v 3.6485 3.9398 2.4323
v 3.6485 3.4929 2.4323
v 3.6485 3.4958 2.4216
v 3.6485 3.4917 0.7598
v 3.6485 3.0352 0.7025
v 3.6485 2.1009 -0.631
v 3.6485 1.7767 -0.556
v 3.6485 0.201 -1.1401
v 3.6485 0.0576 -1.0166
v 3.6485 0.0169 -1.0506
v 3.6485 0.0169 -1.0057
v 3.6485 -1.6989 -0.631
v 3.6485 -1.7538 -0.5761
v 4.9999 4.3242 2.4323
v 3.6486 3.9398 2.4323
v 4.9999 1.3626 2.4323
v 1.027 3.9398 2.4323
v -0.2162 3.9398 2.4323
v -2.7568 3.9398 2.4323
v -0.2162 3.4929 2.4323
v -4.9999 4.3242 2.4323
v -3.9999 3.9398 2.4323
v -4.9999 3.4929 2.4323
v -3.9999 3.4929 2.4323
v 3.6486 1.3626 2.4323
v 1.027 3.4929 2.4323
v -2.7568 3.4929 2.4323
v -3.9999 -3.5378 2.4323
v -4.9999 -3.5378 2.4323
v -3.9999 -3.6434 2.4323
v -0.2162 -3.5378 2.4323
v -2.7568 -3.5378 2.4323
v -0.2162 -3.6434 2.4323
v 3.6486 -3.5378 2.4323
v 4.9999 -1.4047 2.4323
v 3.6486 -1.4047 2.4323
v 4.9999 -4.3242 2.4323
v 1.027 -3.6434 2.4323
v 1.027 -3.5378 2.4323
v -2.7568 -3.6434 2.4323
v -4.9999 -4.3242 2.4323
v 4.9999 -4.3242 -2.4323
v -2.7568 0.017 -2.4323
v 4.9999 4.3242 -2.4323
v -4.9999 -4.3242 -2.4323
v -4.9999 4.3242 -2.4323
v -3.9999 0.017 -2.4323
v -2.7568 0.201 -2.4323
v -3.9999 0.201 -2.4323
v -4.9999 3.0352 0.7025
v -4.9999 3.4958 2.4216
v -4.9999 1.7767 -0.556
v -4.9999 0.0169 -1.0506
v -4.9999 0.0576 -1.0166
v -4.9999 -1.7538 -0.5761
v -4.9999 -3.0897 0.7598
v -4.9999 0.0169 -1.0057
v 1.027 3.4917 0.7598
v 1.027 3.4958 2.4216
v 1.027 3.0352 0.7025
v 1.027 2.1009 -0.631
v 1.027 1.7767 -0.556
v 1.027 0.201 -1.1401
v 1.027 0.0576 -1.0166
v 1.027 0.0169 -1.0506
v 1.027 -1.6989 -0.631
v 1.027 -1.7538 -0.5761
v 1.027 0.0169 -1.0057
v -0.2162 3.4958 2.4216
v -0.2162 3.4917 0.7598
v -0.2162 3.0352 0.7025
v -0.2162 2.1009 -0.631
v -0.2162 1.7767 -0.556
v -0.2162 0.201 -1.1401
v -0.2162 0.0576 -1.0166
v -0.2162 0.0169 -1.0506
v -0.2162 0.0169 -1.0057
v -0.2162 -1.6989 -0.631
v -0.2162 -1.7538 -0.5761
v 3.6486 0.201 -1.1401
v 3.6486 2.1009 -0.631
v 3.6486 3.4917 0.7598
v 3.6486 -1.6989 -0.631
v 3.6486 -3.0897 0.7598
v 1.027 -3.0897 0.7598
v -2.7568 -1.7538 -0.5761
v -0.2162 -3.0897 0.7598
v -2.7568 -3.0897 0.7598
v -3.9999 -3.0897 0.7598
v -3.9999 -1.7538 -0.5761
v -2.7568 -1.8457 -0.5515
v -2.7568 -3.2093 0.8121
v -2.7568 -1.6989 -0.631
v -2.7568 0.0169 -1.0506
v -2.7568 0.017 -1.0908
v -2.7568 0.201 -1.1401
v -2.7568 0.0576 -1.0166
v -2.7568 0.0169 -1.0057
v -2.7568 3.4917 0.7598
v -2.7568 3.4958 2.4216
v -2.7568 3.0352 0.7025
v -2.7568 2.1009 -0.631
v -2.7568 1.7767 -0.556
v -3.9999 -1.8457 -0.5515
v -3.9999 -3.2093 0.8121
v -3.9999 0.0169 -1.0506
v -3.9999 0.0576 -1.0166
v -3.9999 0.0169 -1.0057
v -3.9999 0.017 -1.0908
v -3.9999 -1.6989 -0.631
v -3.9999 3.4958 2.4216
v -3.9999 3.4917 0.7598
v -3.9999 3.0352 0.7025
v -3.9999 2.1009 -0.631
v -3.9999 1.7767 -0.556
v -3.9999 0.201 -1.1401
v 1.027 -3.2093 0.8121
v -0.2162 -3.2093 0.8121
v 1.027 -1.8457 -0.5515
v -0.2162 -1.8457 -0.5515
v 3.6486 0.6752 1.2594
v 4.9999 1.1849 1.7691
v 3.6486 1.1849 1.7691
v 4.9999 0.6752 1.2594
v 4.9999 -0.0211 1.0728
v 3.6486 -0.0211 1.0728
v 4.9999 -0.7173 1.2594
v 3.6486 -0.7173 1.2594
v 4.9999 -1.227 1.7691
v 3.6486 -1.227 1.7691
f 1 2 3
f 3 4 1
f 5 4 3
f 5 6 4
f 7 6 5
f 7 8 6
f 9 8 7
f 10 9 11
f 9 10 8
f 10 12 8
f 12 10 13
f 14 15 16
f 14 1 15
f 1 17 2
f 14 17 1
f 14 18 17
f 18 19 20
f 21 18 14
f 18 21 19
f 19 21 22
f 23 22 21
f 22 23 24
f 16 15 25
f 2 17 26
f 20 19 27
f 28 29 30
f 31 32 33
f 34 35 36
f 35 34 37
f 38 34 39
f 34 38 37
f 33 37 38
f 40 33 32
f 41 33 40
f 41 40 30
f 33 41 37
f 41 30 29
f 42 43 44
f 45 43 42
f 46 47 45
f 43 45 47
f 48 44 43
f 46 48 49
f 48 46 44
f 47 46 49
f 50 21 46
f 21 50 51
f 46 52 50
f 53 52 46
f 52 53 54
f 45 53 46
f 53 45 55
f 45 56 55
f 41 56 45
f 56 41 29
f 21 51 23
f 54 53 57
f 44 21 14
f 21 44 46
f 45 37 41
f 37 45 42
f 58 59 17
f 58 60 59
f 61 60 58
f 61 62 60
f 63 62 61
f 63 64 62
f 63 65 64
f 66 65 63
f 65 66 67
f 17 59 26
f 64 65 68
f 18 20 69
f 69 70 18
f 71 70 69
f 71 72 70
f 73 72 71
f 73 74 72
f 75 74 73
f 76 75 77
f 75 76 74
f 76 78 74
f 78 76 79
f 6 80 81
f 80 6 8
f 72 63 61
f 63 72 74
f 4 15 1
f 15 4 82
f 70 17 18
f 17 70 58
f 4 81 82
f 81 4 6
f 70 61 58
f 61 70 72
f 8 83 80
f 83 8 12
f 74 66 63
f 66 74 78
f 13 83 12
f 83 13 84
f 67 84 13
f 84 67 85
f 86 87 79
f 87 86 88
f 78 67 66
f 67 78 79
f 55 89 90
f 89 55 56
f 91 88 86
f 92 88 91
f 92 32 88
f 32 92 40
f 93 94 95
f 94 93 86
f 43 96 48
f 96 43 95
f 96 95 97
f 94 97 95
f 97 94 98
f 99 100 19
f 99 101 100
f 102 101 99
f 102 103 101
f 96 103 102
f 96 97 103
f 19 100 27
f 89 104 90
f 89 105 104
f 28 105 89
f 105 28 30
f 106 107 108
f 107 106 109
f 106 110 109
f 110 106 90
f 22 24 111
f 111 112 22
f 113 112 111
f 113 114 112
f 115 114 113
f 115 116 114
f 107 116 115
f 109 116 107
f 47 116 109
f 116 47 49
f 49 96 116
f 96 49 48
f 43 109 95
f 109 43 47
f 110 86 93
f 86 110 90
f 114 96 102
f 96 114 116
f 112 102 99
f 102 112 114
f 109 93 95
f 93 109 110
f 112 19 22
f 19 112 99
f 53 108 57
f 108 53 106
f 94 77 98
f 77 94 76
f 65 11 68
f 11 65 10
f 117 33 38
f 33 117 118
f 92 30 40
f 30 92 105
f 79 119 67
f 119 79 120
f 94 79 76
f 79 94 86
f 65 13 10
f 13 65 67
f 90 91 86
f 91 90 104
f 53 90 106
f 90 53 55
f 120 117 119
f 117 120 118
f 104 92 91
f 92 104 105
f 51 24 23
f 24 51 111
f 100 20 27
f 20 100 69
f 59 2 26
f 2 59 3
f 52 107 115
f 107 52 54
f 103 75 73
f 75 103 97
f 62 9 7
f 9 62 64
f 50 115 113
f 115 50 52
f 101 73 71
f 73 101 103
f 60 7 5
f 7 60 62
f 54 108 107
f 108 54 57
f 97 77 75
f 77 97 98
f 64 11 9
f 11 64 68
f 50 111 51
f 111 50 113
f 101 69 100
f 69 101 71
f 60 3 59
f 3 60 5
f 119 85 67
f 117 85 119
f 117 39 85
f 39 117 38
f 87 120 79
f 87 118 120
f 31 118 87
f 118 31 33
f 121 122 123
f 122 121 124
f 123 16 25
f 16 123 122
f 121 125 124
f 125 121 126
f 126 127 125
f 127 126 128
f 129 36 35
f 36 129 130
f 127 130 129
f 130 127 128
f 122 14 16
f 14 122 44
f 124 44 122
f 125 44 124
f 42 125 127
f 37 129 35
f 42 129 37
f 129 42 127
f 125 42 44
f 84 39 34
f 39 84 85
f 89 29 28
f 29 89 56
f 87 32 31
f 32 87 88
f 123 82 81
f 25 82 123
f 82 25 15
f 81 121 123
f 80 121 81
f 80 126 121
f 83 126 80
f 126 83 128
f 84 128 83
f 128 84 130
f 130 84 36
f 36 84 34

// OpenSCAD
intersection() {
  cube(size = [11.9998, 10.3782, 5.83763], center = true);

  union() {
    union() {
      difference() {
        difference() {
          difference() {
            difference() {
              translate([-0.675675, 0, 0])
              cube(size = [8.64845, 8.64844, 4.86466], center = true);
            
              translate([0.405405, 0.20101, 2.65962])
              rotate([0, 90, 0])
              cylinder(h = 1.24315, r1 = 3.79973, r2 = 3.79973, center = true, $fn = 12);
            }
          
            union() {
              translate([-3.37838, 0.108975, 0])
              cube(size = [1.24314, 0.18397, 4.86476], center = true);
            
              translate([-3.37838, 0.20101, 2.65962])
              rotate([0, 90, 0])
              cylinder(h = 1.24314, r1 = 3.79973, r2 = 3.79973, center = true, $fn = 12);
            }
          }
        
          intersection() {
            translate([-0.675675, -2.15369, 7.88379])
            cube(size = [8.64855, 4.34116, 20.6323], center = true);
          
            translate([-7.27568, 0.01694, 2.67473])
            rotate([0, 90, 0])
            cylinder(h = 21.8485, r1 = 3.72531, r2 = 3.72531, center = true, $fn = 12);
          }
        }
      
        translate([-7.27568, 0.05763, 2.42156])
        rotate([0, 90, 0])
        cylinder(h = 21.8485, r1 = 3.43817, r2 = 3.43817, center = true, $fn = 12);
      }
    
      difference() {
        difference() {
          cube(size = [9.9998, 8.64844, 4.86466], center = true);
        
          union() {
            union() {
              translate([0.405405, 0.01694, 2.67473])
              rotate([0, 90, 0])
              cylinder(h = 1.24315, r1 = 3.72531, r2 = 3.72531, center = true, $fn = 12);
            
              translate([-3.37838, 6.93784, 0])
              cube(size = [1.24314, 22.5242, 4.86476], center = true);
            }
          
            translate([-6.6, -0.02106, 2.46531])
            rotate([0, 90, 0])
            cylinder(h = 23.1999, r1 = 1.3925, r2 = 1.3925, center = true, $fn = 12);
          }
        }
      
        translate([-7.27568, 0.20101, 2.65962])
        rotate([0, 90, 0])
        cylinder(h = 21.8485, r1 = 3.79973, r2 = 3.79973, center = true, $fn = 12);
      }
    }
  }
}
